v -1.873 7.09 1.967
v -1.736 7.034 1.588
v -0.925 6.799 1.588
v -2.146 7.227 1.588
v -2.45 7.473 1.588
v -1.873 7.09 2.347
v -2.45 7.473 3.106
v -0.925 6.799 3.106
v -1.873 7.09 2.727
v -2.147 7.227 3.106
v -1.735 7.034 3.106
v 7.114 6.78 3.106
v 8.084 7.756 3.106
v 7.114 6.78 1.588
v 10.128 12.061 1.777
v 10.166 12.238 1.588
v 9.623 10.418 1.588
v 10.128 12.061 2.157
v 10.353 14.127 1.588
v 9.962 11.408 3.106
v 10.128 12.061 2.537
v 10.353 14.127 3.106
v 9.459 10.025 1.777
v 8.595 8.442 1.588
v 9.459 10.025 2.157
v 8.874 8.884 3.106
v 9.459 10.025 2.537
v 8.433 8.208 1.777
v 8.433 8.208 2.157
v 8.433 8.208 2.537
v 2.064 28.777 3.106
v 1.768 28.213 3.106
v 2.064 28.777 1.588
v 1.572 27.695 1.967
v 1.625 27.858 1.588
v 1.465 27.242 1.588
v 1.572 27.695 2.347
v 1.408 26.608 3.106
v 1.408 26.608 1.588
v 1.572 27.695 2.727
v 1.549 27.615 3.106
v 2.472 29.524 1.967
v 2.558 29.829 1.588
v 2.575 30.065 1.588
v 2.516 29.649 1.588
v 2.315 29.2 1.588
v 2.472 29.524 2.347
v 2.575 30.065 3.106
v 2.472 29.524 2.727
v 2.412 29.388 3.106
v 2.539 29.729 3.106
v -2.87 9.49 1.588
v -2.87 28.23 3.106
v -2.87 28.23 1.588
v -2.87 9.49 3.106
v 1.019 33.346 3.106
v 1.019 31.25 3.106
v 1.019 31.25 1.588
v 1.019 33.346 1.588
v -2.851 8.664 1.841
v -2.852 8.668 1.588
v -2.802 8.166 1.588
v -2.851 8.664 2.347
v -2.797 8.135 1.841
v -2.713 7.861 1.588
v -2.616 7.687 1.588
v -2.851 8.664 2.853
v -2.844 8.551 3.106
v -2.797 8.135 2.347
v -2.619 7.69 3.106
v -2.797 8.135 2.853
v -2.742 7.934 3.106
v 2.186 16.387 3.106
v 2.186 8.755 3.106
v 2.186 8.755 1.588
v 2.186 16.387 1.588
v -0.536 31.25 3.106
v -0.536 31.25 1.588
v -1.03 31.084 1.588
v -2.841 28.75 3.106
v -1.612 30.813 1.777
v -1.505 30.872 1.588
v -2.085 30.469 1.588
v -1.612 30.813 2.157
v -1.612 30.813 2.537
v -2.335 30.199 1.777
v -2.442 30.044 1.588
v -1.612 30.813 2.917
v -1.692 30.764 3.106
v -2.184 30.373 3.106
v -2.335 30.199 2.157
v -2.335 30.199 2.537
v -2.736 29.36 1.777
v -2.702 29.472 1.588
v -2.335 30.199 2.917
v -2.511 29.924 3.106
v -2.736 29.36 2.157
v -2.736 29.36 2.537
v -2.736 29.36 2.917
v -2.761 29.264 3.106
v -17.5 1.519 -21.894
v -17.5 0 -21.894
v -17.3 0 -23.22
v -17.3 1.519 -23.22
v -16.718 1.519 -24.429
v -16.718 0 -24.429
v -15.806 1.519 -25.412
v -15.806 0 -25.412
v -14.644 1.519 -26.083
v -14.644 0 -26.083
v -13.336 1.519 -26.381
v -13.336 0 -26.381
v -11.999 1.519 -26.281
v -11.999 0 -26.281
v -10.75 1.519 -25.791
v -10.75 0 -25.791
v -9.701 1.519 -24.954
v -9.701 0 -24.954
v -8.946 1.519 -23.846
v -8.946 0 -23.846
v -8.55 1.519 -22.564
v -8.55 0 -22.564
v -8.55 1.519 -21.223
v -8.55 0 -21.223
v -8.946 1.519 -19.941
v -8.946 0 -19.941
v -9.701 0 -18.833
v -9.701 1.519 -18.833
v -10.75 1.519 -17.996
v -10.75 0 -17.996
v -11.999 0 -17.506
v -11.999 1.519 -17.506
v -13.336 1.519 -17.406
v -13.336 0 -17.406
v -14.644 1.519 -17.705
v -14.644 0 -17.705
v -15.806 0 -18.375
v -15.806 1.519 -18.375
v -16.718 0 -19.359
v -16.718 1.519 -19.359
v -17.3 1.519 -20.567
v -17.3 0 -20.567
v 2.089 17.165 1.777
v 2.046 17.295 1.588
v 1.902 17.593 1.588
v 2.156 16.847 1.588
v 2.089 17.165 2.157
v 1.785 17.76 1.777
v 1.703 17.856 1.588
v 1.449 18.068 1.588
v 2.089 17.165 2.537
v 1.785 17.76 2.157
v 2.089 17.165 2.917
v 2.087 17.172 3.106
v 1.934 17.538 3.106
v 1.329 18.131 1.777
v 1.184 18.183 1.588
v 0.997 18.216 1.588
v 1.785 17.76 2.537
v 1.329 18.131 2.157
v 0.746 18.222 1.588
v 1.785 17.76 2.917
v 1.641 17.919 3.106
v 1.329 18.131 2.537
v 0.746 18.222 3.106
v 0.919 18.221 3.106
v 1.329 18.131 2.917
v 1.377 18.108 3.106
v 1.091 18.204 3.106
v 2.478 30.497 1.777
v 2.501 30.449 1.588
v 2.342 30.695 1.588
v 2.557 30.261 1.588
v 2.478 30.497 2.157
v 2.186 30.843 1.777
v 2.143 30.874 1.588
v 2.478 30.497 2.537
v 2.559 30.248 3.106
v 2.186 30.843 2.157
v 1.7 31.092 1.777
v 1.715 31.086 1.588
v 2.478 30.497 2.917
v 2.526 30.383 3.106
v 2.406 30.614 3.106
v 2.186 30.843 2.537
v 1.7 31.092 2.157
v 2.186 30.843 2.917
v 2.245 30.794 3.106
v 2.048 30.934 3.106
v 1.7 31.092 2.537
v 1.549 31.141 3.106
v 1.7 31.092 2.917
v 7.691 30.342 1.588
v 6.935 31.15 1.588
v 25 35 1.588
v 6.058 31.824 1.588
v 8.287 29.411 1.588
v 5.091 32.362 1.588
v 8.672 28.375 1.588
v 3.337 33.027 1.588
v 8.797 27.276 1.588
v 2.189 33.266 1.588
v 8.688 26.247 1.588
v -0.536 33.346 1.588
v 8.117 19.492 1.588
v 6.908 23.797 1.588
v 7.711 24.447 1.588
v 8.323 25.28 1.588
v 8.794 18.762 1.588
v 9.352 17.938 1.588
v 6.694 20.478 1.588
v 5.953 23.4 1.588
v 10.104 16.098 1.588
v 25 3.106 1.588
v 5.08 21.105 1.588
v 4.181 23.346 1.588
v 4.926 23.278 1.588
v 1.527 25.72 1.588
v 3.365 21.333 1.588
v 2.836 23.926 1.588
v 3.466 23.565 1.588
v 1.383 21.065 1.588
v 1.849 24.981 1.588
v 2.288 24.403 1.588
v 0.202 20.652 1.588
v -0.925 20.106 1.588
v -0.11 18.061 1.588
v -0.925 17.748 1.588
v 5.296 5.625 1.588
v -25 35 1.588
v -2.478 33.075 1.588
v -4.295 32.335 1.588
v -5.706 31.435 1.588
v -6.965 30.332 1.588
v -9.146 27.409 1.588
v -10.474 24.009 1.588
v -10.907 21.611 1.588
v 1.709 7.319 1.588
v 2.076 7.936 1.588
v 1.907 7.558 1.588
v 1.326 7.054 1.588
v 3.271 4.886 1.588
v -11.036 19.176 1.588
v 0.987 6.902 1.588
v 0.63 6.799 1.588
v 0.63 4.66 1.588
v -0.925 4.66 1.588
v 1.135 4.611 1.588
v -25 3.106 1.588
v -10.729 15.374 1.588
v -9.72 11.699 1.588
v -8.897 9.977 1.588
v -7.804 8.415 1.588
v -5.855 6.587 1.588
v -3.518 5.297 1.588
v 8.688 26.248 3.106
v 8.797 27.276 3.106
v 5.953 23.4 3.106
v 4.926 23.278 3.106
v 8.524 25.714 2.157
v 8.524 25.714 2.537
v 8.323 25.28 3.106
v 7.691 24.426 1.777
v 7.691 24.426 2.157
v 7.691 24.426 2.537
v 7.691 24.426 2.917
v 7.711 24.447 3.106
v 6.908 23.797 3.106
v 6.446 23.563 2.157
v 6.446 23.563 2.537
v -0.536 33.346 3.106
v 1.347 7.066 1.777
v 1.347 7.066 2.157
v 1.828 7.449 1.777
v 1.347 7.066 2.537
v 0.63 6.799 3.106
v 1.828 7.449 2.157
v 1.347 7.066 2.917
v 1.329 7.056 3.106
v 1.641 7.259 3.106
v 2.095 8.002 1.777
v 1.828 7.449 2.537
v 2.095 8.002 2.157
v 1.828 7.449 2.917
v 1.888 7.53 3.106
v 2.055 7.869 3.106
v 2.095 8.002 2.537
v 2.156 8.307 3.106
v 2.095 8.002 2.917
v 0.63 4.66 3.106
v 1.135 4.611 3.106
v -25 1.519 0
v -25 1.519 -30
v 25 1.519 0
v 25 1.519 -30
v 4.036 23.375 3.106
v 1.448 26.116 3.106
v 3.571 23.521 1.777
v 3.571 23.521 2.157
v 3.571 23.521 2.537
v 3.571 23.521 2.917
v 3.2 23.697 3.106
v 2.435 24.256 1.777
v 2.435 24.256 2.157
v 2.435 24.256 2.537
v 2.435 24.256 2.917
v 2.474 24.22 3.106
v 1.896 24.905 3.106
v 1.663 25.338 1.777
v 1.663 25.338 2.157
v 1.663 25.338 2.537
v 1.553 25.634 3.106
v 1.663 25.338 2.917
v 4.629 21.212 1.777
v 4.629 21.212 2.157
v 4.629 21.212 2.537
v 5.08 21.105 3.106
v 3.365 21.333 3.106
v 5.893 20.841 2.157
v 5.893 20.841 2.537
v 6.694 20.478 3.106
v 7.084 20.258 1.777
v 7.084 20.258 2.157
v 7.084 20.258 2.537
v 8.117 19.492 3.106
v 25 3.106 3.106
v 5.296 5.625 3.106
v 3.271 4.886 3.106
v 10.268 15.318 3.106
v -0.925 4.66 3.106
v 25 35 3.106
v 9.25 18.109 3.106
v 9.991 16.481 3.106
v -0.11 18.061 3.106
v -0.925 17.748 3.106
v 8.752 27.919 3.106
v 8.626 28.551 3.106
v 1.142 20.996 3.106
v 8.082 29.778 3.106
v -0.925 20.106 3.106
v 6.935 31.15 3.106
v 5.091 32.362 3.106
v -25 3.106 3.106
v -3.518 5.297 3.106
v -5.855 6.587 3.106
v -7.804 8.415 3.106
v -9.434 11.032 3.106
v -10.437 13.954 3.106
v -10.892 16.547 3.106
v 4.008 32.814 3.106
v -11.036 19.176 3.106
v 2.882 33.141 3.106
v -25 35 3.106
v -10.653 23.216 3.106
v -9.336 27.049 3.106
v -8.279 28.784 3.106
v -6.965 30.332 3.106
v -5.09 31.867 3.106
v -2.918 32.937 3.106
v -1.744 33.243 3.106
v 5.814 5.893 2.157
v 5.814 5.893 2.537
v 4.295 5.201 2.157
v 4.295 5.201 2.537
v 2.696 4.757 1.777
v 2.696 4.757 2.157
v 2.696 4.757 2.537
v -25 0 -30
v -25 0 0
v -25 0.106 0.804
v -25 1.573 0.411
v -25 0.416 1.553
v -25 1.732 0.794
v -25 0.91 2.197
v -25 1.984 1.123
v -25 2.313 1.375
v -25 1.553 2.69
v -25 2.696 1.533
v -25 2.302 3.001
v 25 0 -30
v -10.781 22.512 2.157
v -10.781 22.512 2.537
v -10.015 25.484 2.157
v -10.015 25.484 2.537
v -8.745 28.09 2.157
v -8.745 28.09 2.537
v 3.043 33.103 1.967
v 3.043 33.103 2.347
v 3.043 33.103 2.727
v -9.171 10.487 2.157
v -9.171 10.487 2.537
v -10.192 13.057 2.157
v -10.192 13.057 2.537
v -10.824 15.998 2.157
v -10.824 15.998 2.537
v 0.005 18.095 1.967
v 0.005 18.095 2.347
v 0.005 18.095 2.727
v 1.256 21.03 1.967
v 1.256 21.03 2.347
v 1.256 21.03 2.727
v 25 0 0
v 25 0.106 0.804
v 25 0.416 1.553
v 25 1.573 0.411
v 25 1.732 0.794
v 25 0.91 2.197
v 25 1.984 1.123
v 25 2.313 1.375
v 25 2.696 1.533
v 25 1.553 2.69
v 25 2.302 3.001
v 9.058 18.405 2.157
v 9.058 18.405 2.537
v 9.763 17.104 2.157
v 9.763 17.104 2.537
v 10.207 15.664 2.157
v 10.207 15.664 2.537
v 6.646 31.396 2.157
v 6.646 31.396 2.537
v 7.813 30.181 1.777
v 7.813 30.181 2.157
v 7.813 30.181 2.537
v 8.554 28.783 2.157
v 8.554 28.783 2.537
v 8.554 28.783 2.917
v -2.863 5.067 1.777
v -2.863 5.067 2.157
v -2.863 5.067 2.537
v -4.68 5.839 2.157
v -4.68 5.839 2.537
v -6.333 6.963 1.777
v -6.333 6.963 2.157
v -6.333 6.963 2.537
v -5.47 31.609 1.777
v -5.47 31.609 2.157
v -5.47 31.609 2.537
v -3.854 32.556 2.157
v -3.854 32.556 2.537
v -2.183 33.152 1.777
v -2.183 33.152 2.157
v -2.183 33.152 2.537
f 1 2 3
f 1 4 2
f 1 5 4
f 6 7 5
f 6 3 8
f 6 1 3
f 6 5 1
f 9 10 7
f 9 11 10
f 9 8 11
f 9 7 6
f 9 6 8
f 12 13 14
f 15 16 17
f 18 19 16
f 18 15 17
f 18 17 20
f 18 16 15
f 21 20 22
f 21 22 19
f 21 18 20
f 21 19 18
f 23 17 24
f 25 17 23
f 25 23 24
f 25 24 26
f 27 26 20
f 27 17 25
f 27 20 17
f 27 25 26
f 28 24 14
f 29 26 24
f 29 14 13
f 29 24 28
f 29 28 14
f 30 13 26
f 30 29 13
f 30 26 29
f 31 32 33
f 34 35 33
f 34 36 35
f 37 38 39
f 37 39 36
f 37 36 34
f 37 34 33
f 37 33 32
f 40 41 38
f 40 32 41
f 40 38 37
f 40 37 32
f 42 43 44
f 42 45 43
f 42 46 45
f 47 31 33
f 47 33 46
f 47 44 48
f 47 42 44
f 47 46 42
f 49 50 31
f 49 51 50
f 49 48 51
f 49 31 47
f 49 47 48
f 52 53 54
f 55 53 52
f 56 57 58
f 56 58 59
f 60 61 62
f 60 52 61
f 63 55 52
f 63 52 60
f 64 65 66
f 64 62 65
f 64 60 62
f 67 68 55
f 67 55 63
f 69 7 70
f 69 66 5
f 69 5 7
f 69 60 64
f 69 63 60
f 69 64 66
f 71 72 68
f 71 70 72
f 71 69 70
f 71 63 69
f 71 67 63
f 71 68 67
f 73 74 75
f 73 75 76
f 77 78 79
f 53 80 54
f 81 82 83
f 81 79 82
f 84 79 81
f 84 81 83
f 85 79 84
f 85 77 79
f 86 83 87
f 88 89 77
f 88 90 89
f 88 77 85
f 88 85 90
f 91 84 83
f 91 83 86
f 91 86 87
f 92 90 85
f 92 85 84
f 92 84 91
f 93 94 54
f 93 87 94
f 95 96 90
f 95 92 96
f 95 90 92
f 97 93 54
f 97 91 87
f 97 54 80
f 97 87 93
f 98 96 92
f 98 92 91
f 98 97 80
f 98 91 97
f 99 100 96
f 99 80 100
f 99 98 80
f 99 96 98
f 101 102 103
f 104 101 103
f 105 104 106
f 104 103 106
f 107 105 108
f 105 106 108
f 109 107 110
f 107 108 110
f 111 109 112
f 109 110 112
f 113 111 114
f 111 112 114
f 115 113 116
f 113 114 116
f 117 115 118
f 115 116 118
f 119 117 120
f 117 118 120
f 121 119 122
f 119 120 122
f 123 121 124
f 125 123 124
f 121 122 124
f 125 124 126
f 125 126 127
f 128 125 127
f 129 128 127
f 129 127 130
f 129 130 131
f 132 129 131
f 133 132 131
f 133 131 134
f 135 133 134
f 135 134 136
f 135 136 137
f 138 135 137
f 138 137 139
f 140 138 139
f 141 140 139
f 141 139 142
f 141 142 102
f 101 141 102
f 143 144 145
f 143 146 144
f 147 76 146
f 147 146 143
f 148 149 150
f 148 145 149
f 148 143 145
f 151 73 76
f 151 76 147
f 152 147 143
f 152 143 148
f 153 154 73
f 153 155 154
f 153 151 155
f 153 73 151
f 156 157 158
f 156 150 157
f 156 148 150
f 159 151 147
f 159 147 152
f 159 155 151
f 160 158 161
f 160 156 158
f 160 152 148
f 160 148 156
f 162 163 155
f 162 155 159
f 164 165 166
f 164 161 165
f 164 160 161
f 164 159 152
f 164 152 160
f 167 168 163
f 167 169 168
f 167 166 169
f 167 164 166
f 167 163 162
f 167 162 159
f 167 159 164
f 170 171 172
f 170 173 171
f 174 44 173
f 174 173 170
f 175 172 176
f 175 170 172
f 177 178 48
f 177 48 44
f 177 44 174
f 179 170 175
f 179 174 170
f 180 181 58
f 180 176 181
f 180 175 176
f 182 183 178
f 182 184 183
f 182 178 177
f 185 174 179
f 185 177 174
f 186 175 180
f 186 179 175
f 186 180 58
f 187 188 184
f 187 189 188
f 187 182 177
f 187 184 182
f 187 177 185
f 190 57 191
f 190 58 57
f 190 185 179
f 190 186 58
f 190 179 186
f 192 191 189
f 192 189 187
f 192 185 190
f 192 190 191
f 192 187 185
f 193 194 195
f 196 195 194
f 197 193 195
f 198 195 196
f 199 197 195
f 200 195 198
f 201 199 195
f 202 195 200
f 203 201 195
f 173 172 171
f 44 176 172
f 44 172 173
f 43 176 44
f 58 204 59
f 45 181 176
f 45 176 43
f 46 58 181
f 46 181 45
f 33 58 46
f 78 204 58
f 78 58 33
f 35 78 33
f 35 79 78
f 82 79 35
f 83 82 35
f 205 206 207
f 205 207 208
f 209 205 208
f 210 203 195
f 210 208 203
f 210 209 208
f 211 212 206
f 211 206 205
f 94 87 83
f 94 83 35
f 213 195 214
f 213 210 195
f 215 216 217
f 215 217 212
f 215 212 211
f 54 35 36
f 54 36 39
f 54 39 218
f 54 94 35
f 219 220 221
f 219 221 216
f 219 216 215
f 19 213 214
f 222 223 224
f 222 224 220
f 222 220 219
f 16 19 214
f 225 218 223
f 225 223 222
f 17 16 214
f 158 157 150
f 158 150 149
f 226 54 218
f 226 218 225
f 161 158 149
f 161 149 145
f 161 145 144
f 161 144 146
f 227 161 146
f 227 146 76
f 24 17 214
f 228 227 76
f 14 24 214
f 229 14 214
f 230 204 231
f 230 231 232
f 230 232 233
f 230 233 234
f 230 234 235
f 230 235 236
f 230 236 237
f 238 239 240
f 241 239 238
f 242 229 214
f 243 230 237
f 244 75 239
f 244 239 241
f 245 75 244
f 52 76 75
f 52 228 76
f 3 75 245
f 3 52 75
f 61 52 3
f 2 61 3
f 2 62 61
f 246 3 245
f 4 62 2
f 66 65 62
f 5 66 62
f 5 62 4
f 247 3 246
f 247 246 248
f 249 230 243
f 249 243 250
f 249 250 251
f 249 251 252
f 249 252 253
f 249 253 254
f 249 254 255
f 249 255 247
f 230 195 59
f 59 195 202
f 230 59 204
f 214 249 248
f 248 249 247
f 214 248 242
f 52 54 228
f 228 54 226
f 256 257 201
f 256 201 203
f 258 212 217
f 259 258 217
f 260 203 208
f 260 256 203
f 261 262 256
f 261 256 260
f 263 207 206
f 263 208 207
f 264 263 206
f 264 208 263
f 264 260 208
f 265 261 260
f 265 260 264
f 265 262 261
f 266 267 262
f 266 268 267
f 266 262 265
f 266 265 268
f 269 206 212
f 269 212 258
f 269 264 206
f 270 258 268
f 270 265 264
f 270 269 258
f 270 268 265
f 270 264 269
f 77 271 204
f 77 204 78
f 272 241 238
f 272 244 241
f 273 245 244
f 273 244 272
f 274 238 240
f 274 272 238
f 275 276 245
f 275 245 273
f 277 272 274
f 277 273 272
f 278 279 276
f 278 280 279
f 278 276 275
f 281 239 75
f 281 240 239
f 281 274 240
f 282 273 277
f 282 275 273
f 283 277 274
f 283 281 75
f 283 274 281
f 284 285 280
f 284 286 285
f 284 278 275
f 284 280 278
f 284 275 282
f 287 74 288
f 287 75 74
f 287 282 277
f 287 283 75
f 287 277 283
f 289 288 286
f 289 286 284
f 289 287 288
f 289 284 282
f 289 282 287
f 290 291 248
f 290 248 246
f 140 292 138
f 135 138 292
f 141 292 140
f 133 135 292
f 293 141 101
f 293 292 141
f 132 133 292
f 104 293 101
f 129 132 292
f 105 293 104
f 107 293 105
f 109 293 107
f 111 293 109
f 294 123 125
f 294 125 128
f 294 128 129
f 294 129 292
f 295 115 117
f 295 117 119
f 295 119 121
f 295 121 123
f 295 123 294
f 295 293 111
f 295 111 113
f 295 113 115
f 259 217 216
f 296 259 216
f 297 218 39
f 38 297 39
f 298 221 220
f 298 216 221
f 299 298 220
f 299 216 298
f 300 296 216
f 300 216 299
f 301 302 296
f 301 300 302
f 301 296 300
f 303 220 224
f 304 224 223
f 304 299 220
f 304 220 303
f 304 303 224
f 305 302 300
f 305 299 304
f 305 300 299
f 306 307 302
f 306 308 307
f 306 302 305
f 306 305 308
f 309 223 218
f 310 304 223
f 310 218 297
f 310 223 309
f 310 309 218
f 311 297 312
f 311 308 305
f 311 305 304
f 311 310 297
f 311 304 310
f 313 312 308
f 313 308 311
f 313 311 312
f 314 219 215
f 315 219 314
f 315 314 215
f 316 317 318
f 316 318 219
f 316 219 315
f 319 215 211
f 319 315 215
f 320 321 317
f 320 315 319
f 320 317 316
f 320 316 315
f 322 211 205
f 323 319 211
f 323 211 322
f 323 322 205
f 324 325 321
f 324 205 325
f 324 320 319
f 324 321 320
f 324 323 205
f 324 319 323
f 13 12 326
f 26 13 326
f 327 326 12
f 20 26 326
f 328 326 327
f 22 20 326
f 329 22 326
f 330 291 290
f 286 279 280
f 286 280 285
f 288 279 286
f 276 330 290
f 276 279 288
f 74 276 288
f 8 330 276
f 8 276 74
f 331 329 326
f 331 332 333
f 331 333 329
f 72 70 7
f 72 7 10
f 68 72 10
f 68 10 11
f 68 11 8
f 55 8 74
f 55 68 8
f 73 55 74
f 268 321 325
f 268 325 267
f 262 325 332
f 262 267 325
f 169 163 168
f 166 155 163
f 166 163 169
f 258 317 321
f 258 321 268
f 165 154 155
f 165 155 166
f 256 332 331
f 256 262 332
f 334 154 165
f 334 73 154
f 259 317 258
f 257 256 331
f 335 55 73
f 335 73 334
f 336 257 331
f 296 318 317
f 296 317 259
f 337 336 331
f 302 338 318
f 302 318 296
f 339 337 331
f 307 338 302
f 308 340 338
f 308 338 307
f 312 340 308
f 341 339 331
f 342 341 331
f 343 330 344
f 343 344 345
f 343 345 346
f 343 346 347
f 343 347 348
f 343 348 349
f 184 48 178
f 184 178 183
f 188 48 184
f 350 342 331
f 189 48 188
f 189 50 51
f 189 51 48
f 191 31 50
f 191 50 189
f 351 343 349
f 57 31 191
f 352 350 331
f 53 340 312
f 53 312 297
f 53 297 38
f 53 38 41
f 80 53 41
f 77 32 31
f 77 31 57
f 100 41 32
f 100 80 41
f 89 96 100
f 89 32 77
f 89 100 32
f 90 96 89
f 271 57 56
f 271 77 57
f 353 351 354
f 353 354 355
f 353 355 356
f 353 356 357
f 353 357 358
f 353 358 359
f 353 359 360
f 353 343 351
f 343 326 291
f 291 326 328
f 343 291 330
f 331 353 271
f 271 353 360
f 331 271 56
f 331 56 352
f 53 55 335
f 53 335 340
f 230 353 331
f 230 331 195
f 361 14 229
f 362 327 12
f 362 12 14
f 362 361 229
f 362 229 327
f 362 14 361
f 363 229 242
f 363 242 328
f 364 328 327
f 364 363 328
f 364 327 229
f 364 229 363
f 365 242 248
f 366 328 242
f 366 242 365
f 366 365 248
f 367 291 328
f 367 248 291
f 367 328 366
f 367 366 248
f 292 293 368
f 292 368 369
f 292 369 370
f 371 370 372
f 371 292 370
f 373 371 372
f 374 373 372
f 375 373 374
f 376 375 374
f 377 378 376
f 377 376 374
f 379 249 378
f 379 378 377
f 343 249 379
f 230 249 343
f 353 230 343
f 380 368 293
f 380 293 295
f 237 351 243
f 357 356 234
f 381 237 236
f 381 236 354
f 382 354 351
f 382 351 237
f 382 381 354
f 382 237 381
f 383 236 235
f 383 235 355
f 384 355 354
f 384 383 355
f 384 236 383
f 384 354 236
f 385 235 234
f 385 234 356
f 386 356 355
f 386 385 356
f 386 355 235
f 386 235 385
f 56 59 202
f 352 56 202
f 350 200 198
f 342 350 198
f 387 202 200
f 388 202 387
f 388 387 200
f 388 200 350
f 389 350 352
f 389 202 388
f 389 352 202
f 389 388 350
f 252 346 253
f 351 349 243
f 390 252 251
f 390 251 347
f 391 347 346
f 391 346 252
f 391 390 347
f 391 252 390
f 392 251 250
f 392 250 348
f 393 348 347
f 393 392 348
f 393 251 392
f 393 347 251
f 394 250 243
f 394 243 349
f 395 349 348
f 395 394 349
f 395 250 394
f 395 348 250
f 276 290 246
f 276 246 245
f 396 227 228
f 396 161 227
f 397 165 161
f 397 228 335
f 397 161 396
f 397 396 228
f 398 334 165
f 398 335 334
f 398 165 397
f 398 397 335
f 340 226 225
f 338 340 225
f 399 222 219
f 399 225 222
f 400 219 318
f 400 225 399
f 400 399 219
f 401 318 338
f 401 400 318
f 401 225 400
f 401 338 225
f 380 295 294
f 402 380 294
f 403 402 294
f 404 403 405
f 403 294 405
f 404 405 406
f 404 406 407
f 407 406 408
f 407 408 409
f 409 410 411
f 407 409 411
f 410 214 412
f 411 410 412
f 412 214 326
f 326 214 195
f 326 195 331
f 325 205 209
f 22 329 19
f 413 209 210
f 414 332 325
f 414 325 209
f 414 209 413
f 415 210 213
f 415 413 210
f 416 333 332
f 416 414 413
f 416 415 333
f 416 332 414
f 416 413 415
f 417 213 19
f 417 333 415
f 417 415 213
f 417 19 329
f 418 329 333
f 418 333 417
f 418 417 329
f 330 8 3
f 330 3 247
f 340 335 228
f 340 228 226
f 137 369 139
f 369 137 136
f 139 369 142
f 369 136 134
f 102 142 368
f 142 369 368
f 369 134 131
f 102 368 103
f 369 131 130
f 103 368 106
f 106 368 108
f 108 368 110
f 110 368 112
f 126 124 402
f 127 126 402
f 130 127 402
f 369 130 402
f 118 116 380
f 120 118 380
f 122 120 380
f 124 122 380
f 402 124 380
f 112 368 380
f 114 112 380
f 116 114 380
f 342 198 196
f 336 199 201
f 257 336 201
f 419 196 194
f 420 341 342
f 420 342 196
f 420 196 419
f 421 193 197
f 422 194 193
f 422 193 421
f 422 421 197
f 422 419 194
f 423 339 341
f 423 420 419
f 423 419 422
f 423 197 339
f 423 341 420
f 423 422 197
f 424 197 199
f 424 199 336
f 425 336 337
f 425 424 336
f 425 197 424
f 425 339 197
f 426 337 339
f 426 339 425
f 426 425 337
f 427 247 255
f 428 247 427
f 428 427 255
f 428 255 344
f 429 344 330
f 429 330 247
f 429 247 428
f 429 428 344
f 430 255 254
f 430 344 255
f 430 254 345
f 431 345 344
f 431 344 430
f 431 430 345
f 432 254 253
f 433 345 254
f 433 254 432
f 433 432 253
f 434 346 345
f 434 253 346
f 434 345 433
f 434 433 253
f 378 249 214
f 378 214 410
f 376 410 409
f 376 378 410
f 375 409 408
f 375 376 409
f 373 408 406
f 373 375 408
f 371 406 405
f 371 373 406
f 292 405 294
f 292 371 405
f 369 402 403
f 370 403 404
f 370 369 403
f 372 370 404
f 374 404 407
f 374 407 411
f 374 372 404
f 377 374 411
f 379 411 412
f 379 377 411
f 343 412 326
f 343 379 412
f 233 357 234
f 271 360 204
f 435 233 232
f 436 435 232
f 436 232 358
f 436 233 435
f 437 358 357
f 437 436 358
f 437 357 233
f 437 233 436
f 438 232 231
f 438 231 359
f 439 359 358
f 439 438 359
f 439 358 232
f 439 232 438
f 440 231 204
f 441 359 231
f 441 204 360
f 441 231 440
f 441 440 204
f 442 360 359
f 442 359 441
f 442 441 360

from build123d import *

# Parameters (mm, degrees)
SKETCH1_W            = 50
SKETCH1_H            = 30
BASE_FLANGE1_DEPTH   = 1.51892
EDGE_FLANGE1_DEPTH   = 50
M8_CLEARANCE_HOLE1_D = 9
CUT_EXTRUDE1_DEPTH   = 55.277389816


# Sheet-metal steps are written as plain solids
with BuildPart() as part:
    # Sketch1 → Base-Flange1 (new body)
    with BuildSketch(Plane(origin=(0, 0, 0), x_dir=(1, 0, 0), z_dir=(0, 1, 0))):
        with Locations((0, 15)):
            Rectangle(SKETCH1_W, SKETCH1_H)
    extrude(amount=BASE_FLANGE1_DEPTH)

    # Edge-Flange1 section (across the edge) → Edge-Flange1 (add)
    with BuildSketch(Plane(origin=(-25, 1.51892, 1.5875), x_dir=(0, 0, -1), z_dir=(1, 0, 0))):
        with BuildLine():
            Line((-1.51892, 1.5875), (-1.51892, 33.48108))
            Line((-1.51892, 33.48108), (0, 33.48108))
            Line((0, 33.48108), (0, 1.5875))
            ThreePointArc((0, 1.5875), (0.464967985, 0.464967985), (1.5875, 0))
            Line((1.5875, 0), (1.5875, -1.51892))
            ThreePointArc((1.5875, -1.51892), (-0.609070647, -0.609070647), (-1.51892, 1.5875))
        make_face()
    extrude(amount=EDGE_FLANGE1_DEPTH)

    # M8 Clearance Hole1 (through all)
    with Locations(Plane(origin=(0, 1.51892, 0), x_dir=(1, 0, 0), z_dir=(0, 1, 0))):
        with Locations((-13, 21.89358)):
            Hole(M8_CLEARANCE_HOLE1_D / 2)

    # Sketch11 → Cut-Extrude1 (cut, through all)
    with BuildSketch(Plane.XY.offset(3.10642)):
        with BuildLine():
            Line((-0.536205236, 33.346354167), (-0.536205236, 31.25))
            add(Edge.make_bspline(
                [(-0.536205236, 31.25), (-0.732304351, 31.187728797), (-1.102067969, 31.070310494), (-1.604733174, 30.833115296), (-2.017508244, 30.547560299), (-2.348134384, 30.212441135), (-2.583648684, 29.809655364), (-2.755765248, 29.34801065), (-2.848017529, 28.810847769), (-2.862096707, 28.430876813), (-2.869538569, 28.230034722)],
                knots=[0, 0, 0, 0, 1.177836724, 2.220923683, 3.170508287, 4.04032801, 4.893978525, 5.822851288, 6.849219673, 8, 8, 8, 8], degree=3))
            Line((-2.869538569, 28.230034722), (-2.869538569, 9.490451389))
            add(Edge.make_bspline(
                [(-2.869538569, 9.490451389), (-2.867825411, 9.340569917), (-2.864676289, 9.065058229), (-2.856032947, 8.687922323), (-2.830901599, 8.38587715), (-2.796864936, 8.086599995), (-2.694246063, 7.767569857), (-2.532312838, 7.572117956), (-2.450267736, 7.473090278)],
                knots=[0, 0, 0, 0, 1.276365713, 2.34621177, 3.211297358, 3.855222149, 4.913326661, 6, 6, 6, 6], degree=3))
            add(Edge.make_bspline(
                [(-2.450267736, 7.473090278), (-2.372143104, 7.400138444), (-2.201489167, 7.240783867), (-1.849576421, 7.073415225), (-1.421039194, 6.915571991), (-1.09843104, 6.839489909), (-0.925094125, 6.798611111)],
                knots=[0, 0, 0, 0, 0.755126351, 1.649483421, 2.737070691, 4, 4, 4, 4], degree=3))
            Line((-0.925094125, 6.798611111), (-0.925094125, 4.659722222))
            add(Edge.make_bspline(
                [(-0.925094125, 4.659722222), (-1.254477967, 4.70572391), (-1.909616136, 4.797220389), (-2.867595341, 5.052416526), (-3.795873677, 5.392904571), (-4.688251224, 5.825940849), (-5.545074878, 6.341217745), (-6.343237475, 6.957264962), (-7.115245839, 7.634651596), (-7.571961107, 8.152383248), (-7.803566347, 8.414930556)],
                knots=[0, 0, 0, 0, 0.993273036, 1.975601091, 2.956248835, 3.944528193, 4.936047062, 5.938575079, 6.95462918, 8, 8, 8, 8], degree=3))
            add(Edge.make_bspline(
                [(-7.803566347, 8.414930556), (-8.055058907, 8.733178871), (-8.569676873, 9.384396149), (-9.198622321, 10.4993388), (-9.754805445, 11.72710012), (-10.215414522, 13.070861325), (-10.585289747, 14.50493195), (-10.841878152, 16.009183271), (-11.005265617, 17.572495268), (-11.025763903, 18.635000654), (-11.036205236, 19.176215278)],
                knots=[0, 0, 0, 0, 0.848908429, 1.737083309, 2.673598995, 3.670958022, 4.709700774, 5.773871062, 6.866063596, 8, 8, 8, 8], degree=3))
            add(Edge.make_bspline(
                [(-11.036205236, 19.176215278), (-11.026382584, 19.748044697), (-11.00719909, 20.864819137), (-10.803957186, 22.492136825), (-10.496270468, 24.032412225), (-10.041921928, 25.477668954), (-9.472269882, 26.8365081), (-8.767858972, 28.100340729), (-7.942830537, 29.28019574), (-7.291562466, 29.981060383), (-6.96502468, 30.332465278)],
                knots=[0, 0, 0, 0, 1.125083173, 2.197270879, 3.223201206, 4.213147336, 5.174373174, 6.118528402, 7.056653326, 8, 8, 8, 8], degree=3))
            add(Edge.make_bspline(
                [(-6.96502468, 30.332465278), (-6.725570757, 30.561318773), (-6.251387297, 31.014510524), (-5.487846636, 31.614362799), (-4.688422822, 32.12911505), (-3.86871675, 32.565937556), (-3.032292491, 32.912249239), (-2.196660266, 33.165240479), (-1.364102414, 33.317178289), (-0.810236123, 33.33669706), (-0.536205236, 33.346354167)],
                knots=[0, 0, 0, 0, 1.091574889, 2.161613191, 3.195169959, 4.222755612, 5.219792993, 6.174728054, 7.096928445, 8, 8, 8, 8], degree=3))
        make_face()
        with BuildLine():
            Line((1.01935032, 31.25), (1.01935032, 33.346354167))
            add(Edge.make_bspline(
                [(1.01935032, 33.346354167), (1.35638191, 33.334410674), (2.037279483, 33.310281496), (3.058991771, 33.118596613), (4.086623836, 32.809565238), (4.751119346, 32.513303808), (5.090530875, 32.361979167)],
                knots=[0, 0, 0, 0, 0.957329974, 1.934072875, 2.94476415, 4, 4, 4, 4], degree=3))
            add(Edge.make_bspline(
                [(5.090530875, 32.361979167), (5.37000628, 32.21892083), (5.91492361, 31.939987638), (6.646983826, 31.416730734), (7.286526768, 30.837752524), (7.82321414, 30.197129791), (8.256096639, 29.513712062), (8.573154519, 28.794283899), (8.762120848, 28.043236683), (8.785435523, 27.532288153), (8.797128098, 27.276041667)],
                knots=[0, 0, 0, 0, 1.133386976, 2.209862454, 3.240979251, 4.243853893, 5.220771738, 6.155072333, 7.074747837, 8, 8, 8, 8], degree=3))
            add(Edge.make_bspline(
                [(8.797128098, 27.276041667), (8.785638647, 27.003188082), (8.763244087, 26.471357992), (8.548147846, 25.708802292), (8.197928052, 25.014727339), (7.708022484, 24.411080511), (7.125276809, 23.904679385), (6.45424304, 23.538240792), (5.711854464, 23.317351012), (5.193341007, 23.291224684), (4.926468375, 23.277777778)],
                knots=[0, 0, 0, 0, 1.052335015, 2.051149251, 3.034759759, 4.037094461, 5.036307284, 5.99952726, 6.970380773, 8, 8, 8, 8], degree=3))
            add(Edge.make_bspline(
                [(4.926468375, 23.277777778), (4.690324716, 23.288887346), (4.228795332, 23.310600367), (3.563454835, 23.498531551), (2.960039675, 23.816514126), (2.421279895, 24.239764216), (1.97438813, 24.750484649), (1.643916355, 25.323376327), (1.446805269, 25.950992233), (1.421287465, 26.385472211), (1.408239209, 26.607638889)],
                knots=[0, 0, 0, 0, 1.052177608, 2.056421433, 3.054792914, 4.078048738, 5.096504648, 6.06384139, 7.009966053, 8, 8, 8, 8], degree=3))
            add(Edge.make_bspline(
                [(1.408239209, 26.607638889), (1.417230139, 26.788519635), (1.435506133, 27.156198562), (1.561436361, 27.705294624), (1.770484915, 28.252331108), (1.964711734, 28.598881271), (2.064489209, 28.776909722)],
                knots=[0, 0, 0, 0, 0.946230724, 1.923416974, 2.933225545, 4, 4, 4, 4], degree=3))
            add(Edge.make_bspline(
                [(2.064489209, 28.776909722), (2.152068669, 28.919314407), (2.30090363, 29.161320873), (2.46871514, 29.496928508), (2.563747337, 29.786024985), (2.571152453, 29.971229688), (2.574905875, 30.065104167)],
                knots=[0, 0, 0, 0, 1.426676034, 2.424532782, 3.201444875, 4, 4, 4, 4], degree=3))
            add(Edge.make_bspline(
                [(2.574905875, 30.065104167), (2.57089384, 30.142783896), (2.563194833, 30.291849587), (2.484310793, 30.502479258), (2.358514484, 30.688139304), (2.186764713, 30.855164059), (1.959059048, 30.986654466), (1.690482224, 31.102662213), (1.371607963, 31.192747437), (1.141356267, 31.230170329), (1.01935032, 31.25)],
                knots=[0, 0, 0, 0, 0.864688311, 1.659317839, 2.475251474, 3.355494564, 4.310252246, 5.394837407, 6.619574429, 8, 8, 8, 8], degree=3))
        make_face()
        with BuildLine():
            Line((-0.925094125, 17.748263889), (-0.925094125, 20.105902778))
            add(Edge.make_bspline(
                [(-0.925094125, 20.105902778), (-0.562172057, 20.292252137), (0.141848053, 20.653744887), (1.229104149, 21.047376471), (2.303547114, 21.282260708), (3.015380537, 21.316516402), (3.364836431, 21.333333333)],
                knots=[0, 0, 0, 0, 1.085282539, 2.105302489, 3.069848097, 4, 4, 4, 4], degree=3))
            add(Edge.make_bspline(
                [(3.364836431, 21.333333333), (3.575767493, 21.32728003), (3.999566405, 21.315117842), (4.635355291, 21.222102337), (5.267804942, 21.05982284), (5.896889917, 20.850033552), (6.507494748, 20.584589713), (7.083966485, 20.267929702), (7.626171736, 19.909707688), (7.95313475, 19.631336083), (8.116572542, 19.4921875)],
                knots=[0, 0, 0, 0, 0.972589152, 1.954108701, 2.955474046, 3.980479148, 5.009562198, 6.021200449, 7.010864794, 8, 8, 8, 8], degree=3))
            add(Edge.make_bspline(
                [(8.116572542, 19.4921875), (8.286591287, 19.323607302), (8.627940088, 18.985146688), (9.071361238, 18.408935486), (9.454453028, 17.780658412), (9.776451155, 17.106691604), (10.028216962, 16.397029145), (10.222125832, 15.662485068), (10.331364306, 14.901746379), (10.345542817, 14.386322918), (10.352683653, 14.126736111)],
                knots=[0, 0, 0, 0, 0.960654025, 1.928717332, 2.91079185, 3.911286876, 4.922404946, 5.930508659, 6.95772566, 8, 8, 8, 8], degree=3))
            add(Edge.make_bspline(
                [(10.352683653, 14.126736111), (10.342759002, 13.779655432), (10.322905808, 13.085357977), (10.142569288, 12.051162813), (9.862554364, 11.02542886), (9.476763198, 10.022432767), (9.004721612, 9.072584195), (8.453195982, 8.205333864), (7.831858662, 7.432367139), (7.350754184, 6.995429904), (7.113968375, 6.780381944)],
                knots=[0, 0, 0, 0, 1.007304958, 2.015004901, 3.039646456, 4.091698815, 5.130844098, 6.114845671, 7.072181175, 8, 8, 8, 8], degree=3))
            add(Edge.make_bspline(
                [(7.113968375, 6.780381944), (6.90801948, 6.620680668), (6.492761858, 6.298672764), (5.810841905, 5.877851847), (5.075224903, 5.510264937), (4.300519423, 5.189578578), (3.502536323, 4.938418331), (2.707743298, 4.746095899), (1.917876024, 4.633000789), (1.394402127, 4.618367855), (1.134801709, 4.611111111)],
                knots=[0, 0, 0, 0, 0.965288144, 1.946323901, 2.963451572, 4.010279453, 5.050032815, 6.060491454, 7.038161726, 8, 8, 8, 8], degree=3))
            Line((1.134801709, 4.611111111), (0.630461431, 4.659722222))
            Line((0.630461431, 4.659722222), (0.630461431, 6.798611111))
            add(Edge.make_bspline(
                [(0.630461431, 6.798611111), (0.761629372, 6.832809064), (1.009712074, 6.897488897), (1.339469946, 7.055085592), (1.619820156, 7.225387633), (1.836416232, 7.442876654), (2.00089705, 7.701001552), (2.10558164, 8.011490131), (2.173038554, 8.367464004), (2.181530549, 8.621171288), (2.186016987, 8.755208333)],
                knots=[0, 0, 0, 0, 1.174511043, 2.221395497, 3.163228448, 4.009149245, 4.86326273, 5.798169132, 6.836742493, 8, 8, 8, 8], degree=3))
            Line((2.186016987, 8.755208333), (2.186016987, 16.387152778))
            add(Edge.make_bspline(
                [(2.186016987, 16.387152778), (2.181817499, 16.525217563), (2.17384572, 16.787302382), (2.101574404, 17.159744372), (1.974463868, 17.485857622), (1.796962527, 17.761186859), (1.584899926, 17.984342452), (1.334196604, 18.144788488), (1.046391899, 18.224495567), (0.847588512, 18.222991473), (0.74591282, 18.222222222)],
                knots=[0, 0, 0, 0, 1.252532866, 2.377650834, 3.425917608, 4.410309965, 5.333554112, 6.20090564, 7.079874001, 8, 8, 8, 8], degree=3))
            add(Edge.make_bspline(
                [(0.74591282, 18.222222222), (0.630014522, 18.213015719), (0.379223237, 18.193093849), (-0.016789147, 18.093798205), (-0.460026427, 17.948951586), (-0.764057901, 17.817754823), (-0.925094125, 17.748263889)],
                knots=[0, 0, 0, 0, 0.797685093, 1.726103611, 2.795586252, 4, 4, 4, 4], degree=3))
        make_face()
    extrude(amount=-CUT_EXTRUDE1_DEPTH, mode=Mode.SUBTRACT)


solid = part.part
